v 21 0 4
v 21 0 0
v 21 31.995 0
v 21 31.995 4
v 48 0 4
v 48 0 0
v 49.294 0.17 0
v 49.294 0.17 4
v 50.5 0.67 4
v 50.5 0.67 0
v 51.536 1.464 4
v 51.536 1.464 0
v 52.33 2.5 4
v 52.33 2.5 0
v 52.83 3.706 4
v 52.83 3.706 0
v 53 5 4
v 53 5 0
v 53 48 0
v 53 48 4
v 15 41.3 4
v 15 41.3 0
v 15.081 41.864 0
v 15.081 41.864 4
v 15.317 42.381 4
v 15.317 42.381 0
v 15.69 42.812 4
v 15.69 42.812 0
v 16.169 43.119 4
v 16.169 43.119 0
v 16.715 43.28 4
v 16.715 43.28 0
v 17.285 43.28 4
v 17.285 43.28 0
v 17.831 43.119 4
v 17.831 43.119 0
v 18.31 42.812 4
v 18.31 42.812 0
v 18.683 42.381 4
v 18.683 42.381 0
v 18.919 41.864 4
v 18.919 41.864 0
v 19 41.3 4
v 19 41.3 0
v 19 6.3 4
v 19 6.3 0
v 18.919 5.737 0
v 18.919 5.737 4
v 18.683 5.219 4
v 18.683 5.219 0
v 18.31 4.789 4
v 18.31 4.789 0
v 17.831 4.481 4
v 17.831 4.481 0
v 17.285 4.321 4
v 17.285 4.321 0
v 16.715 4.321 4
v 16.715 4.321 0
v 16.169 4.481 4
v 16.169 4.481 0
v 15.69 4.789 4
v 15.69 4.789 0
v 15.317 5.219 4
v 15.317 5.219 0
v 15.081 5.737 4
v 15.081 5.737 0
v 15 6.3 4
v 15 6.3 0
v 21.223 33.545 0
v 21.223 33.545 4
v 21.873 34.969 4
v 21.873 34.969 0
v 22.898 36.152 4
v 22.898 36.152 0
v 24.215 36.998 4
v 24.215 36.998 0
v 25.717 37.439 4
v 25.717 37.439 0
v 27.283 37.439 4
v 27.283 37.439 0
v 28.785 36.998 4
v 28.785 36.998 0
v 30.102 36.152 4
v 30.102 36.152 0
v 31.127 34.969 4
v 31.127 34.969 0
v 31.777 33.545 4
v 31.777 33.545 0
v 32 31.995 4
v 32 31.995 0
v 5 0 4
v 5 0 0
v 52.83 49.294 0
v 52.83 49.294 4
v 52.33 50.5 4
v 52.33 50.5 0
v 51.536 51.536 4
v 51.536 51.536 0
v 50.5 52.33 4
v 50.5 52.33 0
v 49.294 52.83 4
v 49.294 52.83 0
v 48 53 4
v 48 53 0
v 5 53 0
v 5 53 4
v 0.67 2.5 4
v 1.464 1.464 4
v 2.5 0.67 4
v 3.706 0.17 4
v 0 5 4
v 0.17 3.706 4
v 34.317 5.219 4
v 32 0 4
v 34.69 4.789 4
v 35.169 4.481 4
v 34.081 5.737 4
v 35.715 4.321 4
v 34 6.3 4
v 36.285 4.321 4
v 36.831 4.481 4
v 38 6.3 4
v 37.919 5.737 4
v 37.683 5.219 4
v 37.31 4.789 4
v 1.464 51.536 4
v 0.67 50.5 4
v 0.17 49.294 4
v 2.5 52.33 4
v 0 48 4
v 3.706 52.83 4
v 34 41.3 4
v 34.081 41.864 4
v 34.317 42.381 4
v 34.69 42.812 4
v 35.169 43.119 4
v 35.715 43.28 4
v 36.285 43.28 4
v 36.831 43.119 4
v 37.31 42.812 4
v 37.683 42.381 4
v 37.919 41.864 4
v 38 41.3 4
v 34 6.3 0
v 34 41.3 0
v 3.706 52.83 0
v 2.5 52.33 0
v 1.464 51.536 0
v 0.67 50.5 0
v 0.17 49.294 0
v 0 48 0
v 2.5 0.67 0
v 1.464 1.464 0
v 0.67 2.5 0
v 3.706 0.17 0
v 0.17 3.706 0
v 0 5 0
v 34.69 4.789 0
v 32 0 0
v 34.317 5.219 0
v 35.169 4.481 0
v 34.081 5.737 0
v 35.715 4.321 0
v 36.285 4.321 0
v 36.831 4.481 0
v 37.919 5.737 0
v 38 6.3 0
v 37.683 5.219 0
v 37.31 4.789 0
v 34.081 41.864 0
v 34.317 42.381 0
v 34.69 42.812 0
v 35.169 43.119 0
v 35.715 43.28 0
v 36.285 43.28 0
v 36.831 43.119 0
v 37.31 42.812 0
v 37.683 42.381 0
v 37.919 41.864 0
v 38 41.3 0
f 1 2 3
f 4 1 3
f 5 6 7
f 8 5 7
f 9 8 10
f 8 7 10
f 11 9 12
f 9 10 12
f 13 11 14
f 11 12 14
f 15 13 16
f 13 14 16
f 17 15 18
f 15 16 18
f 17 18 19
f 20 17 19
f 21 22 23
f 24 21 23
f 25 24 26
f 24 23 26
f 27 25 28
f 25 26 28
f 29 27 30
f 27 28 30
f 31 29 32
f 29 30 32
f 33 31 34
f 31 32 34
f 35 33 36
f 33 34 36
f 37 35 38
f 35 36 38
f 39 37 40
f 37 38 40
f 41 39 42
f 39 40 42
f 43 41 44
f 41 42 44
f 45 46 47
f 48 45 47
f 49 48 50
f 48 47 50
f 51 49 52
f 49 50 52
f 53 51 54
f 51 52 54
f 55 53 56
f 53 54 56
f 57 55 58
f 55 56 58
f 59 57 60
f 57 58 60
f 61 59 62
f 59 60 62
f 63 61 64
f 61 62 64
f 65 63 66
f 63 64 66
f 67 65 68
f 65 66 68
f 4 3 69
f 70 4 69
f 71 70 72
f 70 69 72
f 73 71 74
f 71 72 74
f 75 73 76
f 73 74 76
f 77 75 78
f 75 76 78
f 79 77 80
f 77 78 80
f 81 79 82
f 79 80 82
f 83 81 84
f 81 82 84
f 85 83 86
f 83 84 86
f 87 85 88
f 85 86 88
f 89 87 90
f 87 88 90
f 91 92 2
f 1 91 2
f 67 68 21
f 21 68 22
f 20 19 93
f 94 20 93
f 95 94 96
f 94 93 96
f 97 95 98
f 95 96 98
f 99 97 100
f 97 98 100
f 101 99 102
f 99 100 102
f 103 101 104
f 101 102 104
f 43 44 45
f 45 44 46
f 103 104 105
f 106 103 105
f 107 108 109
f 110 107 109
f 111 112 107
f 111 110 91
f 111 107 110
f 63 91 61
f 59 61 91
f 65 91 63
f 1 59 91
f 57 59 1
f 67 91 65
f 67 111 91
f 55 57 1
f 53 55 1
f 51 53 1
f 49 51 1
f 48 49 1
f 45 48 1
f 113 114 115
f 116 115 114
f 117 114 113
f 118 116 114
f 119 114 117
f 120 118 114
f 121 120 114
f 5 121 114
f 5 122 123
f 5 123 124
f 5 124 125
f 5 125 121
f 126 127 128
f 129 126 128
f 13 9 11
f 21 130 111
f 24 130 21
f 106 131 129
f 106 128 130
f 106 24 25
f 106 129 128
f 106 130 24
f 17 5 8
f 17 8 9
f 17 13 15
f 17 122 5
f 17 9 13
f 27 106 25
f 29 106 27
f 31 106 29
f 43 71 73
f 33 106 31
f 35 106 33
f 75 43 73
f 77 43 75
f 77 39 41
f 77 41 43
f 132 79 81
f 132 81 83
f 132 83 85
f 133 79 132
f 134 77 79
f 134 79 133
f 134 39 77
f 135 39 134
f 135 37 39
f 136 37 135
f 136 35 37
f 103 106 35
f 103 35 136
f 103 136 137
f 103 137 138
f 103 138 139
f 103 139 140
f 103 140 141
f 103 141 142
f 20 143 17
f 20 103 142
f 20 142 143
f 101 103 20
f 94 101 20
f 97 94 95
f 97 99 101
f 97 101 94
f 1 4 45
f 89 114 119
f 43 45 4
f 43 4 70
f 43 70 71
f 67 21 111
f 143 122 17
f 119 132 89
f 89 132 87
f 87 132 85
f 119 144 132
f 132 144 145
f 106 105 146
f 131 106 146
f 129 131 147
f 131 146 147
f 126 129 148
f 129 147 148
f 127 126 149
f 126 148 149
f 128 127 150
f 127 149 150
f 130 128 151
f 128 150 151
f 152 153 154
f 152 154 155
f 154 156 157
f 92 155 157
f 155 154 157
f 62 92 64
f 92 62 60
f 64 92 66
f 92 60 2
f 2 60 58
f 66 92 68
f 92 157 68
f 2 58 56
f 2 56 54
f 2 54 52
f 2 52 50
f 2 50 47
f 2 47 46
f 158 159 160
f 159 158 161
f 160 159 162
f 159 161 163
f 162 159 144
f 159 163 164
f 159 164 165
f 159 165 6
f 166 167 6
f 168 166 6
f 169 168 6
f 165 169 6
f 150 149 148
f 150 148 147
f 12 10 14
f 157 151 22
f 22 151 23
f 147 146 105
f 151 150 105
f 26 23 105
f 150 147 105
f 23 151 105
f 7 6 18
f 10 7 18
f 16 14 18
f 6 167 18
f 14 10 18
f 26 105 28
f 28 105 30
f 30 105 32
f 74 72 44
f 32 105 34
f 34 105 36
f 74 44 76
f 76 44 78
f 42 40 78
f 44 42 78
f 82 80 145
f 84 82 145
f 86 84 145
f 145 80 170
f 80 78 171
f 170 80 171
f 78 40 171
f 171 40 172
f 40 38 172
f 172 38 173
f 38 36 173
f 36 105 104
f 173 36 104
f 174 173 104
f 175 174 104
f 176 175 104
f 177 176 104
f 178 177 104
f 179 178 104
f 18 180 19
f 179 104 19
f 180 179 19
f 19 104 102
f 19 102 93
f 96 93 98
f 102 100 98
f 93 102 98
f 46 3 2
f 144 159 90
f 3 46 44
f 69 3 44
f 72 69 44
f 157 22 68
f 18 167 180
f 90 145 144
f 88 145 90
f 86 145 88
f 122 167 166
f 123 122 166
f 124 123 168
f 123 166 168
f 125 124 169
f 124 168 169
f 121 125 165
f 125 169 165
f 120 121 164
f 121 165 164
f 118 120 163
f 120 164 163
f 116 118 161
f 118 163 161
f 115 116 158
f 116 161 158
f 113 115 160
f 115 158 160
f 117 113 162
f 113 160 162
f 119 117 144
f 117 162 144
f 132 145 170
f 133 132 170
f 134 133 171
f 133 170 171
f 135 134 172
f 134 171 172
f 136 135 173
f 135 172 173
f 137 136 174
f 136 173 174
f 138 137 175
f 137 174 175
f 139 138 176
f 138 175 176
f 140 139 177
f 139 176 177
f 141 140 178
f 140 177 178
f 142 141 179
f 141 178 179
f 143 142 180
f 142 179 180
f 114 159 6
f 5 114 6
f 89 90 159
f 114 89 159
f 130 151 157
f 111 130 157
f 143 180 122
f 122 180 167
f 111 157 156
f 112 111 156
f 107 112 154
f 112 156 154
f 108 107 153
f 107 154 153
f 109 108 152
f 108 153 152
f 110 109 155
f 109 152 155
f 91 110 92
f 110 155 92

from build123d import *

# Parameters (mm, degrees)
BOSS_EXTRUDE2_DEPTH = 4


with BuildPart() as part:
    # Sketch1 → Boss-Extrude2 (new body)
    with BuildSketch(Plane.XY):
        with BuildLine():
            Line((0, 48), (0, 5))
            ThreePointArc((0, 5), (1.464466094, 1.464466094), (5, 0))
            Line((5, 0), (21, 0))
            Line((21, 0), (21, 31.99499657))
            ThreePointArc((21, 31.99499657), (26.5, 37.49499657), (32, 31.99499657))
            Line((32, 31.99499657), (32, 0))
            Line((32, 0), (48, 0))
            ThreePointArc((48, 0), (51.535533906, 1.464466094), (53, 5))
            Line((53, 5), (53, 48))
            ThreePointArc((53, 48), (51.535533906, 51.535533906), (48, 53))
            Line((48, 53), (5, 53))
            ThreePointArc((5, 53), (1.464466094, 51.535533906), (0, 48))
        make_face()
        with BuildLine():
            Line((19, 41.300206215), (19, 6.300206215))
            ThreePointArc((19, 6.300206215), (17, 4.300206215), (15, 6.300206215))
            Line((15, 6.300206215), (15, 41.300206215))
            ThreePointArc((15, 41.300206215), (17, 43.300206215), (19, 41.300206215))
        make_face(mode=Mode.SUBTRACT)
        with BuildLine():
            Line((38, 41.300206215), (38, 6.300206215))
            ThreePointArc((38, 6.300206215), (36, 4.300206215), (34, 6.300206215))
            Line((34, 6.300206215), (34, 41.300206215))
            ThreePointArc((34, 41.300206215), (36, 43.300206215), (38, 41.300206215))
        make_face(mode=Mode.SUBTRACT)
    extrude(amount=BOSS_EXTRUDE2_DEPTH)


solid = part.part
